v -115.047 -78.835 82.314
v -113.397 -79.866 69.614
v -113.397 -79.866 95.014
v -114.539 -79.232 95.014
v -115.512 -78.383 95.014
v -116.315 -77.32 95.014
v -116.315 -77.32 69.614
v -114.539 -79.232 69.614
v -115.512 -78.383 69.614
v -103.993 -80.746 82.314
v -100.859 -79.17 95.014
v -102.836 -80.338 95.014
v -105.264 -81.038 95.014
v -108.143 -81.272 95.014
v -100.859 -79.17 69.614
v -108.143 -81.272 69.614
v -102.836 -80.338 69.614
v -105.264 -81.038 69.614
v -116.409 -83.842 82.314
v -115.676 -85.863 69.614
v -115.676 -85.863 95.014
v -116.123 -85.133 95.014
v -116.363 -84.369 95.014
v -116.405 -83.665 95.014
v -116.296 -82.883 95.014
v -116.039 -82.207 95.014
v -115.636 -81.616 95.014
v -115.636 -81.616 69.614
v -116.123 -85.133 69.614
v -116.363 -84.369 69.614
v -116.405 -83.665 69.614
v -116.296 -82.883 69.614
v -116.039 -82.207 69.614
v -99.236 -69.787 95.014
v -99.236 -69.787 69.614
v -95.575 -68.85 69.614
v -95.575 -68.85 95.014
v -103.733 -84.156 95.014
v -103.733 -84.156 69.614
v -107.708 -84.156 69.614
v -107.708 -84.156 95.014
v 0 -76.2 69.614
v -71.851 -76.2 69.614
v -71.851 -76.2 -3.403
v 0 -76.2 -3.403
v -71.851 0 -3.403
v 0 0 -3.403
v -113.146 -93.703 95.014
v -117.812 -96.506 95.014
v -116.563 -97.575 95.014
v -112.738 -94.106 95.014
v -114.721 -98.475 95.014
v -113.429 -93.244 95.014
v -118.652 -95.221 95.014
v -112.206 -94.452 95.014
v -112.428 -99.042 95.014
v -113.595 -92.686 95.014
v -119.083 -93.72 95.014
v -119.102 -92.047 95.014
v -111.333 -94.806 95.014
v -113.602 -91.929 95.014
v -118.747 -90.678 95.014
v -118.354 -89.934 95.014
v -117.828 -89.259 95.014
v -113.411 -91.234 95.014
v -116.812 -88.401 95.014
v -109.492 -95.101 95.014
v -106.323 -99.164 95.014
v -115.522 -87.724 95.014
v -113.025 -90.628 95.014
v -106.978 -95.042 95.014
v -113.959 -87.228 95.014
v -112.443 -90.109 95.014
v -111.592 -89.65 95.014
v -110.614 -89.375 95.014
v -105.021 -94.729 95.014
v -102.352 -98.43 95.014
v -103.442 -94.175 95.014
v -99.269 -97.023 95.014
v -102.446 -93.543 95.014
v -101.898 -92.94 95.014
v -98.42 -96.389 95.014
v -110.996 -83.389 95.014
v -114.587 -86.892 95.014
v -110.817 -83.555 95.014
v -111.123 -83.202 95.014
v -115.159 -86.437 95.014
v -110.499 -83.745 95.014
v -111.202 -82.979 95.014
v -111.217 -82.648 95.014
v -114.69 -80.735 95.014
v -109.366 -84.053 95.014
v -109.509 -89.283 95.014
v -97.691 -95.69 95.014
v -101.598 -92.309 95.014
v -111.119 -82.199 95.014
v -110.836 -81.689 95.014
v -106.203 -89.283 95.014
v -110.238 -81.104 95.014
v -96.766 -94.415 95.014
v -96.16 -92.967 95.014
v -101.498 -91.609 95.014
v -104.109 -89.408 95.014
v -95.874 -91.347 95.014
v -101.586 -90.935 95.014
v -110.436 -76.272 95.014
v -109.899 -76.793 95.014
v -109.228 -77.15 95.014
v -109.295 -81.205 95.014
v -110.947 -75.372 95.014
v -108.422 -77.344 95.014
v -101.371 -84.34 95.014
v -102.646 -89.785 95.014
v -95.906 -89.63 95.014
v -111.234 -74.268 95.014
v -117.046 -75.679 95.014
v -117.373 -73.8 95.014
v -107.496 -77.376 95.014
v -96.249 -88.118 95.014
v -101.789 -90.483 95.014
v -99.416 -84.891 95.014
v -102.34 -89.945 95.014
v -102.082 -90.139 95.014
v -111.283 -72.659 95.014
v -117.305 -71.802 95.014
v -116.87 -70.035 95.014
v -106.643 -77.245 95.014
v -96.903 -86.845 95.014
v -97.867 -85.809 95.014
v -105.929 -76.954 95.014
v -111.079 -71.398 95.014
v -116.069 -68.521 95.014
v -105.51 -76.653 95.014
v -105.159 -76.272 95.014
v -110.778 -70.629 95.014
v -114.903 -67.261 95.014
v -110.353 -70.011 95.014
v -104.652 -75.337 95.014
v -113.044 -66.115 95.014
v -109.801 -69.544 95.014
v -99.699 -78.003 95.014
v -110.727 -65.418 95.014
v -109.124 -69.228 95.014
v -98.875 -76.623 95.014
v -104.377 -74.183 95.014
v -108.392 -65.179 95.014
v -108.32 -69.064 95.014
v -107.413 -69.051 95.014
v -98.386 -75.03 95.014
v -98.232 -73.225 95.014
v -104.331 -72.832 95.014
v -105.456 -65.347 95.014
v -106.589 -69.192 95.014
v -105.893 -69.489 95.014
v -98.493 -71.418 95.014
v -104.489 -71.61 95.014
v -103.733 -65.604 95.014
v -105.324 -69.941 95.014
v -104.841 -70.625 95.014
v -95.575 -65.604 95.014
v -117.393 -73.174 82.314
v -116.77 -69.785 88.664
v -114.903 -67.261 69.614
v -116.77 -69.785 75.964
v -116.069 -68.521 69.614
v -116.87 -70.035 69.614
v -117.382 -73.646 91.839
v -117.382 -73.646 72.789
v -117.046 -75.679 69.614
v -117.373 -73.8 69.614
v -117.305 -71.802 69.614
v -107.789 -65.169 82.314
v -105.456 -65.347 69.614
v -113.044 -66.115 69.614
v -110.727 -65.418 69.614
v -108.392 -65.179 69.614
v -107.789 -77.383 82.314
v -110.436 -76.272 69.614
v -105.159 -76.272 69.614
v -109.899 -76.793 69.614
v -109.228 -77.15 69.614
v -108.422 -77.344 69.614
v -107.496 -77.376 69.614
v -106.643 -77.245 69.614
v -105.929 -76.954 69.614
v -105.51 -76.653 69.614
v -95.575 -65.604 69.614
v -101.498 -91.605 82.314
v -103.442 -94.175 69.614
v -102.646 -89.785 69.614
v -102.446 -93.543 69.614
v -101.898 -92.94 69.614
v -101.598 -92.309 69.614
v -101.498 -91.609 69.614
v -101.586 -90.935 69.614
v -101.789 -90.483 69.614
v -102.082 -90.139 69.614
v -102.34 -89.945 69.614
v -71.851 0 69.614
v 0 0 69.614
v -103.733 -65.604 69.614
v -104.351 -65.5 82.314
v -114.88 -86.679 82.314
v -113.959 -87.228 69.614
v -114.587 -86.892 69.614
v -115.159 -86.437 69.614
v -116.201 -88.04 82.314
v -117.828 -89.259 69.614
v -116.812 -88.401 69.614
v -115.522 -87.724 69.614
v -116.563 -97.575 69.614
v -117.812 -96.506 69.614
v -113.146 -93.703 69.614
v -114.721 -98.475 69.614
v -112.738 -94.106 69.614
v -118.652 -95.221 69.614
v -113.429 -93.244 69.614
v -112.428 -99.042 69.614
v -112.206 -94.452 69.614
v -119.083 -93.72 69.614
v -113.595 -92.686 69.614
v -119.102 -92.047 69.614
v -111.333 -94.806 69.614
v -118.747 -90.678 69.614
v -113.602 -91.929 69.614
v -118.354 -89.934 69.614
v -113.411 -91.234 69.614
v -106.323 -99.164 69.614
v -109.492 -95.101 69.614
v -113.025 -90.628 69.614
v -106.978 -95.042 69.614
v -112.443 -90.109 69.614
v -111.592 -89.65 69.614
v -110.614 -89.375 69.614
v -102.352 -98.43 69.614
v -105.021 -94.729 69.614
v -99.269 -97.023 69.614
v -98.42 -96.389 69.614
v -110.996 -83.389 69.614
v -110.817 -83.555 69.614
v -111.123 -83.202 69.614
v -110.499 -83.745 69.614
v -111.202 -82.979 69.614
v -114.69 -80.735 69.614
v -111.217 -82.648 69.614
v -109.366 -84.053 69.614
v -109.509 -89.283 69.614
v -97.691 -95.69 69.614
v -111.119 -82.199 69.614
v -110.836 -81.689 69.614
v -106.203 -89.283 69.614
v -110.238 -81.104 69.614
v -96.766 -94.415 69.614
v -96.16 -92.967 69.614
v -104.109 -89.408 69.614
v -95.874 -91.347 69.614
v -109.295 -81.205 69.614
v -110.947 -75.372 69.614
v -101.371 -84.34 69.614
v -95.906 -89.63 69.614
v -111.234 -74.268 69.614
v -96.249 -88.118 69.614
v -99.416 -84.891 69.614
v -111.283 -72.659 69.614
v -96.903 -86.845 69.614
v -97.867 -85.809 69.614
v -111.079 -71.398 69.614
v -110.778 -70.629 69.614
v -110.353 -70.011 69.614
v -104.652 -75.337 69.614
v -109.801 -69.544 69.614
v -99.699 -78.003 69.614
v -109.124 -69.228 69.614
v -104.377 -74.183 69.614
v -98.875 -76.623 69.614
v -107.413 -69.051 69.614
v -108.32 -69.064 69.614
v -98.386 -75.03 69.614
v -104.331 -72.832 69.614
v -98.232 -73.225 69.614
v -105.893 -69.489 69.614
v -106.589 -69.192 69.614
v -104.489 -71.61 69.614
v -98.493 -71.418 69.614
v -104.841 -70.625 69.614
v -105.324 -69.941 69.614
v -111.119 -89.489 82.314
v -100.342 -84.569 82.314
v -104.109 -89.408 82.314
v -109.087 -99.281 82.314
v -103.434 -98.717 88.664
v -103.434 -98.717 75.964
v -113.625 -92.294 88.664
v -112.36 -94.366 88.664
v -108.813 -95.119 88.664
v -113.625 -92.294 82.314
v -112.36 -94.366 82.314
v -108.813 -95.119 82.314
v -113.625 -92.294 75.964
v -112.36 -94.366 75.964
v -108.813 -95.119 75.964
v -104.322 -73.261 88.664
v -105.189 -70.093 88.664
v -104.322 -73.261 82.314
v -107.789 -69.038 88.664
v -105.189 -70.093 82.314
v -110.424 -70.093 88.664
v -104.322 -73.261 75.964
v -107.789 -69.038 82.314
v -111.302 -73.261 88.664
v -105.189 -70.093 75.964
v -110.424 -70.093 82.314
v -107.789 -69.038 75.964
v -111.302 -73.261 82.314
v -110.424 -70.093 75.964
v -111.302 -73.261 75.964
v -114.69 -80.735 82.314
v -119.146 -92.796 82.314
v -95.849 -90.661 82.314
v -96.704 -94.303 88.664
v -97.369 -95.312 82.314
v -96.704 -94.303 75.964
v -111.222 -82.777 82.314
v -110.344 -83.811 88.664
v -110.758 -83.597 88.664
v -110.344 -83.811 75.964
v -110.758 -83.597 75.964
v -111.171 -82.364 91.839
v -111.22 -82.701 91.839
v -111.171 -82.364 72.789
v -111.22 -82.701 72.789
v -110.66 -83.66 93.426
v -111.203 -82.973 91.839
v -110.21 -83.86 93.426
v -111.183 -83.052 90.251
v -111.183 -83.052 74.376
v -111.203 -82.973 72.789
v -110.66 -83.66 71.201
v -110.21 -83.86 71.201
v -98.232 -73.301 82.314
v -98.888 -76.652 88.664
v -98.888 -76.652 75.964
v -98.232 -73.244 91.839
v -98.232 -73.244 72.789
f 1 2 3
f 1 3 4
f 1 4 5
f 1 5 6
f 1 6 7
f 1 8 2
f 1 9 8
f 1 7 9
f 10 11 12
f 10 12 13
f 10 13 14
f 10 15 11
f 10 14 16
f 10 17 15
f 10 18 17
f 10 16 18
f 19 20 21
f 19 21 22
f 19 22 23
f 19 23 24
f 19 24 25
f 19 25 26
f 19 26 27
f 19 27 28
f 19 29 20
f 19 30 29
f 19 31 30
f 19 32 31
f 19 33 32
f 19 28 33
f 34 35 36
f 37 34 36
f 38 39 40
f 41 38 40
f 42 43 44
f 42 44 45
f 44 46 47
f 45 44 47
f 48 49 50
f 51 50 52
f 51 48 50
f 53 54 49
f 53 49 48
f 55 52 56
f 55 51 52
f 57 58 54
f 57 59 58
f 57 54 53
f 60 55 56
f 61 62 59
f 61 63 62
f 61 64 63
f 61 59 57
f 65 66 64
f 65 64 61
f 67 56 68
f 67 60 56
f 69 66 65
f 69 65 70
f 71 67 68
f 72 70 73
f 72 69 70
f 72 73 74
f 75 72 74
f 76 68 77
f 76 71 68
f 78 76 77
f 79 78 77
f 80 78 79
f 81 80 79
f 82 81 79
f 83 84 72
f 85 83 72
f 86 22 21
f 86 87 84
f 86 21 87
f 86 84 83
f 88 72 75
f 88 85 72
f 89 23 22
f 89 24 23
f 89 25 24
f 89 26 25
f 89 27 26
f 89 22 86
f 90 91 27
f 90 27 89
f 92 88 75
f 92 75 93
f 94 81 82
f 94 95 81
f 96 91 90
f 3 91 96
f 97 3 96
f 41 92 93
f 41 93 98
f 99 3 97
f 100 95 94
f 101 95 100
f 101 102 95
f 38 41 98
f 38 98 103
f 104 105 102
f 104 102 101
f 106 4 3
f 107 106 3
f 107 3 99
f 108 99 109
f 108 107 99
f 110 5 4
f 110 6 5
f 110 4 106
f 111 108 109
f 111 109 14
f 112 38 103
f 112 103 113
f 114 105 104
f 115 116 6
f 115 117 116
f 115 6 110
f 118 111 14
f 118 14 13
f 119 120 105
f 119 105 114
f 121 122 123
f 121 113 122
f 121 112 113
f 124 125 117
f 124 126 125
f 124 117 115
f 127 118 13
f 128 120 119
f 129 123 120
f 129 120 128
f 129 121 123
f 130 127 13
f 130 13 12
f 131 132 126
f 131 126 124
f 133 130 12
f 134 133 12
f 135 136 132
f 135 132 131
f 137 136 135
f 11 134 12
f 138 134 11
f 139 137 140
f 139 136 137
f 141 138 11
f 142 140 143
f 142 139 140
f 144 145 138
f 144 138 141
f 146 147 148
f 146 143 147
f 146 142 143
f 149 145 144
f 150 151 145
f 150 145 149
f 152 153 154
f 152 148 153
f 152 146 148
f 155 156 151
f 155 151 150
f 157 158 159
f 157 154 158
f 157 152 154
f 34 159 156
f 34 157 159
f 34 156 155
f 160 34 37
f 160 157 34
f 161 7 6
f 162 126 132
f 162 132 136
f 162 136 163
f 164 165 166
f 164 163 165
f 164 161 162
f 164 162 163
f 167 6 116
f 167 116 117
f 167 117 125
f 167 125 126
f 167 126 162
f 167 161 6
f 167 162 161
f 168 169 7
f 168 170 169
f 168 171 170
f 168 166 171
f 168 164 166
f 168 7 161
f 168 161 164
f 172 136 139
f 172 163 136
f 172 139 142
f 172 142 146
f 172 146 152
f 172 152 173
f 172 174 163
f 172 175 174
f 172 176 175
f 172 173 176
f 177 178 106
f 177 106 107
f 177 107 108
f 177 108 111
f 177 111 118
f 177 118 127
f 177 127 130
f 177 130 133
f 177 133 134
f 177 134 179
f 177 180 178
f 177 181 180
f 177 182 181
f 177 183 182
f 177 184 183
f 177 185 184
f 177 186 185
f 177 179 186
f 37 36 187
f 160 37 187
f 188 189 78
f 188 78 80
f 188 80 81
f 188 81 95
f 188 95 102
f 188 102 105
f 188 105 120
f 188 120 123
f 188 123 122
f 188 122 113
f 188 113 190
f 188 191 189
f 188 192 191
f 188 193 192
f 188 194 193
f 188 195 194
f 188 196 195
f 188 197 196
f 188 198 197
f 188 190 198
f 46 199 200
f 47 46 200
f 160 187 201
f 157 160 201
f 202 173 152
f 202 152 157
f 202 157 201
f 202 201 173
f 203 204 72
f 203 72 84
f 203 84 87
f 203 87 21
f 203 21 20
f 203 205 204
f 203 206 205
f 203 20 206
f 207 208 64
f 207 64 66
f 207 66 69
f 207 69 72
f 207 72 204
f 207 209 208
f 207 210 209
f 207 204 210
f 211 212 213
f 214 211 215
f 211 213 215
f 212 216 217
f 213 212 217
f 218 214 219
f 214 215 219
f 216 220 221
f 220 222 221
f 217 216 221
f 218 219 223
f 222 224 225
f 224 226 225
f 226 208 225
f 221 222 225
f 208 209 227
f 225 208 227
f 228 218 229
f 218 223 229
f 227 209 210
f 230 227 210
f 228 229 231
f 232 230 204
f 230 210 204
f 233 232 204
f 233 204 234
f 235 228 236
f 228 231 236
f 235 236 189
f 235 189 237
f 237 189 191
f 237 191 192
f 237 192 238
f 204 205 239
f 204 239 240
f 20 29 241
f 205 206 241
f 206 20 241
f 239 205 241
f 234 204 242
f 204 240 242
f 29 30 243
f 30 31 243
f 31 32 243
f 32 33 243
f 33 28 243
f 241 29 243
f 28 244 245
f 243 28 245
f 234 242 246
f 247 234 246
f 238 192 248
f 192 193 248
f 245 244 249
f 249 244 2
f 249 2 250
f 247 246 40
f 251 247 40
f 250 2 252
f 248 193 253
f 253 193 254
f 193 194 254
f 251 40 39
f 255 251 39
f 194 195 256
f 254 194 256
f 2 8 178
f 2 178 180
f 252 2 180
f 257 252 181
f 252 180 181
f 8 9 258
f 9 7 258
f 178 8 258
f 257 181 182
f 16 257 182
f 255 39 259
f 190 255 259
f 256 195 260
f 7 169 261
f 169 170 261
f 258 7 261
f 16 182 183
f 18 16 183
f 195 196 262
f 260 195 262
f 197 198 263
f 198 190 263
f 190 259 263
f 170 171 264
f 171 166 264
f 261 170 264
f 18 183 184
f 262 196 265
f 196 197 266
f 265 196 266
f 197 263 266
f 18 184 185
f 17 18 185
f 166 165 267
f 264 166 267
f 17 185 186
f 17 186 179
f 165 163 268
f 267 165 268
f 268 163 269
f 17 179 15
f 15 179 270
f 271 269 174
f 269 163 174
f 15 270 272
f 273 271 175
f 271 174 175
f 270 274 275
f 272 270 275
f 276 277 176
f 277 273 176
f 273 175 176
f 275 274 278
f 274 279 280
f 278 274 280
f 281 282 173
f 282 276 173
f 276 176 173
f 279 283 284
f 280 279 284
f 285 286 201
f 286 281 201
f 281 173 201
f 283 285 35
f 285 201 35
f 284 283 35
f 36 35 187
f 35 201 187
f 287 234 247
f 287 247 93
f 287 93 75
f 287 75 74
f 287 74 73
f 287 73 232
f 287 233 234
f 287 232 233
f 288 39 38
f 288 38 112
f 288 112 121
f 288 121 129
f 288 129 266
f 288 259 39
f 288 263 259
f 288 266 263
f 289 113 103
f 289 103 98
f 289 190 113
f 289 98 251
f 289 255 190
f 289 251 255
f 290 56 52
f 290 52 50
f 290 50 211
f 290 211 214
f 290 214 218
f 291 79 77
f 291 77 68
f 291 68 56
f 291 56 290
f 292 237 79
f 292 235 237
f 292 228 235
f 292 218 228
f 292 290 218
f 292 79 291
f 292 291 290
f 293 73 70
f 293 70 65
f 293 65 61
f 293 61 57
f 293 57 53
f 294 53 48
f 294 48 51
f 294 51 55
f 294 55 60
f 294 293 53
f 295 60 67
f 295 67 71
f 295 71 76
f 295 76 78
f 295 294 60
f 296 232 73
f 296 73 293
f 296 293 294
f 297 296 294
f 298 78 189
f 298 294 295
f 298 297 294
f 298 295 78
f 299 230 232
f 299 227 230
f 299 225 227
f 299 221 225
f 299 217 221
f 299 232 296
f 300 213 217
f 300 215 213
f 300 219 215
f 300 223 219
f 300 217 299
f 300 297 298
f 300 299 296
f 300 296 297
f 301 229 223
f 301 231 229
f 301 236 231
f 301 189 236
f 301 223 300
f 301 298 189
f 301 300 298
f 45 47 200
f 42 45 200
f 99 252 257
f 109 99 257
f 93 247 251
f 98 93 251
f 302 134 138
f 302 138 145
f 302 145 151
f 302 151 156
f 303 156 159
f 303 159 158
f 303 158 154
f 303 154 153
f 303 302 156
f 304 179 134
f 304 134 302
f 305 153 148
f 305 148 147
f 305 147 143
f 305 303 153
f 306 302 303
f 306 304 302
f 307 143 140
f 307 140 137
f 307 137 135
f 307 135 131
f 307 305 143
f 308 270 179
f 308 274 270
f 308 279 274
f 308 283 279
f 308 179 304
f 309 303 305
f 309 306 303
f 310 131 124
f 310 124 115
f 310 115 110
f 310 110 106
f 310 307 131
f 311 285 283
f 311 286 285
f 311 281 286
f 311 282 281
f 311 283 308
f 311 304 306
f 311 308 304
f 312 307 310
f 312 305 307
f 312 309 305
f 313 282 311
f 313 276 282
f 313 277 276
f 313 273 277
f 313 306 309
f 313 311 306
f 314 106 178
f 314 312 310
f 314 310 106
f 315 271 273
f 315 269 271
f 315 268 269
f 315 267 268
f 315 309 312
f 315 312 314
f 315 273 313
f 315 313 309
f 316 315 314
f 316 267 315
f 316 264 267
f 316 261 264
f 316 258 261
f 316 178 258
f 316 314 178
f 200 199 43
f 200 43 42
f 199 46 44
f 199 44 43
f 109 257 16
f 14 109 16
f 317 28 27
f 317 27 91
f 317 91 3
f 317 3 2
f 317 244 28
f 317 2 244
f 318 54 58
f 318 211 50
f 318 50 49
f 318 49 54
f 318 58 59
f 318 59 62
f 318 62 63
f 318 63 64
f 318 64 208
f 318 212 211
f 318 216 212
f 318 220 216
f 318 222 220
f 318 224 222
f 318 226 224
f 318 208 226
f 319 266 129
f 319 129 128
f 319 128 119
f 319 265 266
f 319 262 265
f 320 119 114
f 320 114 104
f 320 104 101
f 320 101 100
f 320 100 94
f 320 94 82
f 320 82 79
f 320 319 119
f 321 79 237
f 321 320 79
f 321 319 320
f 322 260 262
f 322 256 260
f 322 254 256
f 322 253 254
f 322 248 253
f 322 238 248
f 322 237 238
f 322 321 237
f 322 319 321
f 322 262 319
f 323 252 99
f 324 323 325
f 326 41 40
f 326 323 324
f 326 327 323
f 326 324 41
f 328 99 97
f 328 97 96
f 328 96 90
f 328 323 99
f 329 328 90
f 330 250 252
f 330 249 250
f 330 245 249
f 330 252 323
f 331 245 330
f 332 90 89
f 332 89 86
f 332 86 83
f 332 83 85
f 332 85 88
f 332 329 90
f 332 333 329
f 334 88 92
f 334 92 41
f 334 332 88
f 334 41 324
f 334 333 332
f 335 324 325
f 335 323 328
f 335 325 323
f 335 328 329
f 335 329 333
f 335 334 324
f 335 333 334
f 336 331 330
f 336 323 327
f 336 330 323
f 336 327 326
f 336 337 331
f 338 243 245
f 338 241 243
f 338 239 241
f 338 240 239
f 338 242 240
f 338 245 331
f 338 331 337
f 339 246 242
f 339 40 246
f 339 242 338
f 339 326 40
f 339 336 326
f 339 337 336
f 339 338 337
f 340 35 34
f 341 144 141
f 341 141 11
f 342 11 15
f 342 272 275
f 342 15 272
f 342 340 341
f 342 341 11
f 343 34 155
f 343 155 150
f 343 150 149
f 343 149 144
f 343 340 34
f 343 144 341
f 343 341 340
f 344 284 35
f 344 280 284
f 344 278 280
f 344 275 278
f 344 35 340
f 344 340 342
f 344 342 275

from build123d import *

# Parameters (mm, degrees)
F0_W     = 71.8512311578
F0_H     = 73.0170495808
F1_DEPTH = 76.2
F3_DEPTH = 25.4


with BuildPart() as f1:
    # F0 (on Front) → F1 (new body)
    with BuildSketch(Plane.XZ):
        with Locations((-35.9256155789, 33.1052001566)):
            Rectangle(F0_W, F0_H)
    extrude(amount=F1_DEPTH)


with BuildPart() as f3:
    # F2 (on face) → F3 (new body)
    with BuildSketch(Plane.XY.offset(69.613724947)):
        with BuildLine():
            Line((-95.5748152677, -68.850259835), (-95.5748152677, -65.6043650912))
            Line((-95.5748152677, -65.6043650912), (-103.7330538093, -65.6043650912))
            add(Edge.make_bspline(
                [(-105.4563896784, -65.3467012817), (-104.1078375323, -65.5240542934), (-103.7330538093, -65.6043650912)],
                knots=[0, 0, 0, 1, 1, 1], degree=2))
            add(Edge.make_bspline(
                [(-107.7887490974, -65.1693482699), (-106.8049418245, -65.1693482699), (-105.4563896784, -65.3467012817)],
                knots=[0, 0, 0, 1, 1, 1], degree=2))
            add(Edge.make_bspline(
                [(-114.9029472678, -67.2607752955), (-112.4133125365, -65.1693482699), (-107.7887490974, -65.1693482699)],
                knots=[0, 0, 0, 1, 1, 1], degree=2))
            add(Edge.make_bspline(
                [(-117.3925819991, -73.1736577824), (-117.3925819991, -69.3522023212), (-114.9029472678, -67.2607752955)],
                knots=[0, 0, 0, 1, 1, 1], degree=2))
            add(Edge.make_bspline(
                [(-116.3150787955, -77.319702718), (-117.3925819991, -75.5629040165), (-117.3925819991, -73.1736577824)],
                knots=[0, 0, 0, 1, 1, 1], degree=2))
            add(Edge.make_bspline(
                [(-113.3971198093, -79.8662242645), (-115.2375755919, -79.0765014196), (-116.3150787955, -77.319702718)],
                knots=[0, 0, 0, 1, 1, 1], degree=2))
            add(Edge.make_bspline(
                [(-115.6357832976, -81.6163303995), (-114.8627918689, -80.7295653406), (-113.3971198093, -79.8662242645)],
                knots=[0, 0, 0, 1, 1, 1], degree=2))
            add(Edge.make_bspline(
                [(-116.4087747262, -83.8416087548), (-116.4087747262, -82.5030954584), (-115.6357832976, -81.6163303995)],
                knots=[0, 0, 0, 1, 1, 1], degree=2))
            add(Edge.make_bspline(
                [(-115.6759386965, -85.8627638324), (-116.4087747262, -84.9124193919), (-116.4087747262, -83.8416087548)],
                knots=[0, 0, 0, 1, 1, 1], degree=2))
            add(Edge.make_bspline(
                [(-113.9592953938, -87.2280473947), (-114.9431026667, -86.8131082728), (-115.6759386965, -85.8627638324)],
                knots=[0, 0, 0, 1, 1, 1], degree=2))
            add(Edge.make_bspline(
                [(-117.8275988204, -89.259241322), (-116.5091632235, -87.8370709446), (-113.9592953938, -87.2280473947)],
                knots=[0, 0, 0, 1, 1, 1], degree=2))
            add(Edge.make_bspline(
                [(-119.1460344174, -92.7962627078), (-119.1460344174, -90.6814116994), (-117.8275988204, -89.259241322)],
                knots=[0, 0, 0, 1, 1, 1], degree=2))
            add(Edge.make_bspline(
                [(-116.5627037553, -97.5747551759), (-119.1460344174, -95.868150723), (-119.1460344174, -92.7962627078)],
                knots=[0, 0, 0, 1, 1, 1], degree=2))
            add(Edge.make_bspline(
                [(-109.0871069949, -99.2813596289), (-113.9793730933, -99.2813596289), (-116.5627037553, -97.5747551759)],
                knots=[0, 0, 0, 1, 1, 1], degree=2))
            add(Edge.make_bspline(
                [(-99.2691119657, -97.0226184412), (-102.6890134381, -99.2813596289), (-109.0871069949, -99.2813596289)],
                knots=[0, 0, 0, 1, 1, 1], degree=2))
            add(Edge.make_bspline(
                [(-95.8492104934, -90.661334), (-95.8492104934, -94.7638772535), (-99.2691119657, -97.0226184412)],
                knots=[0, 0, 0, 1, 1, 1], degree=2))
            add(Edge.make_bspline(
                [(-97.8670192878, -85.8092233005), (-95.8492104934, -87.4622872216), (-95.8492104934, -90.661334)],
                knots=[0, 0, 0, 1, 1, 1], degree=2))
            add(Edge.make_bspline(
                [(-103.7330538093, -84.1561593794), (-99.8848280821, -84.1561593794), (-97.8670192878, -85.8092233005)],
                knots=[0, 0, 0, 1, 1, 1], degree=2))
            Line((-103.7330538093, -84.1561593794), (-107.7084382996, -84.1561593794))
            add(Edge.make_bspline(
                [(-111.2220357027, -82.7774906841), (-111.2220357027, -84.1561593794), (-107.7084382996, -84.1561593794)],
                knots=[0, 0, 0, 1, 1, 1], degree=2))
            add(Edge.make_bspline(
                [(-110.2382284298, -81.1043490636), (-111.2220357027, -81.8539165096), (-111.2220357027, -82.7774906841)],
                knots=[0, 0, 0, 1, 1, 1], degree=2))
            Line((-110.2382284298, -81.1043490636), (-109.2945765558, -81.2047375609))
            Line((-109.2945765558, -81.2047375609), (-108.1434551209, -81.2716632257))
            add(Edge.make_bspline(
                [(-100.8585965052, -79.1701973503), (-103.4854288494, -81.2716632257), (-108.1434551209, -81.2716632257)],
                knots=[0, 0, 0, 1, 1, 1], degree=2))
            add(Edge.make_bspline(
                [(-98.231764161, -73.3008165456), (-98.231764161, -77.068731475), (-100.8585965052, -79.1701973503)],
                knots=[0, 0, 0, 1, 1, 1], degree=2))
            add(Edge.make_bspline(
                [(-99.2356491333, -69.7872191425), (-98.231764161, -71.3599722658), (-98.231764161, -73.3008165456)],
                knots=[0, 0, 0, 1, 1, 1], degree=2))
            Line((-99.2356491333, -69.7872191425), (-95.5748152677, -68.850259835))
        make_face()
        with BuildLine():
            add(Edge.make_bspline(
                [(-113.6246670697, -92.2943202216), (-113.6246670697, -93.6127558186), (-112.3597720046, -94.3656695478)],
                knots=[0, 0, 0, 1, 1, 1], degree=2))
            add(Edge.make_bspline(
                [(-112.4434290856, -90.1091972652), (-113.6246670697, -90.9357292257), (-113.6246670697, -92.2943202216)],
                knots=[0, 0, 0, 1, 1, 1], degree=2))
            add(Edge.make_bspline(
                [(-109.5087386833, -89.2826653047), (-111.2621911016, -89.2826653047), (-112.4434290856, -90.1091972652)],
                knots=[0, 0, 0, 1, 1, 1], degree=2))
            Line((-109.5087386833, -89.2826653047), (-106.2026108411, -89.2826653047))
            add(Edge.make_bspline(
                [(-102.6455117559, -89.7846077908), (-103.7932869076, -89.2826653047), (-106.2026108411, -89.2826653047)],
                knots=[0, 0, 0, 1, 1, 1], degree=2))
            add(Edge.make_bspline(
                [(-101.4977366043, -91.604985874), (-101.4977366043, -90.286550277), (-102.6455117559, -89.7846077908)],
                knots=[0, 0, 0, 1, 1, 1], degree=2))
            add(Edge.make_bspline(
                [(-103.4419271673, -94.1749314031), (-101.4977366043, -93.2312795291), (-101.4977366043, -91.604985874)],
                knots=[0, 0, 0, 1, 1, 1], degree=2))
            add(Edge.make_bspline(
                [(-108.8127117691, -95.118583277), (-105.3861177303, -95.118583277), (-103.4419271673, -94.1749314031)],
                knots=[0, 0, 0, 1, 1, 1], degree=2))
            add(Edge.make_bspline(
                [(-112.3597720046, -94.3656695478), (-111.0948769395, -95.118583277), (-108.8127117691, -95.118583277)],
                knots=[0, 0, 0, 1, 1, 1], degree=2))
        make_face(mode=Mode.SUBTRACT)
        with BuildLine():
            add(Edge.make_bspline(
                [(-111.3023465005, -73.2606611467), (-111.3023465005, -75.1613500276), (-110.435659141, -76.2723160636)],
                knots=[0, 0, 0, 1, 1, 1], degree=2))
            add(Edge.make_bspline(
                [(-107.7887490974, -69.0376516965), (-111.3023465005, -69.0376516965), (-111.3023465005, -73.2606611467)],
                knots=[0, 0, 0, 1, 1, 1], degree=2))
            add(Edge.make_bspline(
                [(-104.3219996597, -73.2606611467), (-104.3219996597, -69.0376516965), (-107.7887490974, -69.0376516965)],
                knots=[0, 0, 0, 1, 1, 1], degree=2))
            add(Edge.make_bspline(
                [(-105.1585704699, -76.2723160636), (-104.3219996597, -75.1613500276), (-104.3219996597, -73.2606611467)],
                knots=[0, 0, 0, 1, 1, 1], degree=2))
            add(Edge.make_bspline(
                [(-107.7887490974, -77.3832820996), (-105.9951412802, -77.3832820996), (-105.1585704699, -76.2723160636)],
                knots=[0, 0, 0, 1, 1, 1], degree=2))
            add(Edge.make_bspline(
                [(-110.435659141, -76.2723160636), (-109.5689717816, -77.3832820996), (-107.7887490974, -77.3832820996)],
                knots=[0, 0, 0, 1, 1, 1], degree=2))
        make_face(mode=Mode.SUBTRACT)
    extrude(amount=F3_DEPTH)


solid = Compound([f1.part, f3.part])
